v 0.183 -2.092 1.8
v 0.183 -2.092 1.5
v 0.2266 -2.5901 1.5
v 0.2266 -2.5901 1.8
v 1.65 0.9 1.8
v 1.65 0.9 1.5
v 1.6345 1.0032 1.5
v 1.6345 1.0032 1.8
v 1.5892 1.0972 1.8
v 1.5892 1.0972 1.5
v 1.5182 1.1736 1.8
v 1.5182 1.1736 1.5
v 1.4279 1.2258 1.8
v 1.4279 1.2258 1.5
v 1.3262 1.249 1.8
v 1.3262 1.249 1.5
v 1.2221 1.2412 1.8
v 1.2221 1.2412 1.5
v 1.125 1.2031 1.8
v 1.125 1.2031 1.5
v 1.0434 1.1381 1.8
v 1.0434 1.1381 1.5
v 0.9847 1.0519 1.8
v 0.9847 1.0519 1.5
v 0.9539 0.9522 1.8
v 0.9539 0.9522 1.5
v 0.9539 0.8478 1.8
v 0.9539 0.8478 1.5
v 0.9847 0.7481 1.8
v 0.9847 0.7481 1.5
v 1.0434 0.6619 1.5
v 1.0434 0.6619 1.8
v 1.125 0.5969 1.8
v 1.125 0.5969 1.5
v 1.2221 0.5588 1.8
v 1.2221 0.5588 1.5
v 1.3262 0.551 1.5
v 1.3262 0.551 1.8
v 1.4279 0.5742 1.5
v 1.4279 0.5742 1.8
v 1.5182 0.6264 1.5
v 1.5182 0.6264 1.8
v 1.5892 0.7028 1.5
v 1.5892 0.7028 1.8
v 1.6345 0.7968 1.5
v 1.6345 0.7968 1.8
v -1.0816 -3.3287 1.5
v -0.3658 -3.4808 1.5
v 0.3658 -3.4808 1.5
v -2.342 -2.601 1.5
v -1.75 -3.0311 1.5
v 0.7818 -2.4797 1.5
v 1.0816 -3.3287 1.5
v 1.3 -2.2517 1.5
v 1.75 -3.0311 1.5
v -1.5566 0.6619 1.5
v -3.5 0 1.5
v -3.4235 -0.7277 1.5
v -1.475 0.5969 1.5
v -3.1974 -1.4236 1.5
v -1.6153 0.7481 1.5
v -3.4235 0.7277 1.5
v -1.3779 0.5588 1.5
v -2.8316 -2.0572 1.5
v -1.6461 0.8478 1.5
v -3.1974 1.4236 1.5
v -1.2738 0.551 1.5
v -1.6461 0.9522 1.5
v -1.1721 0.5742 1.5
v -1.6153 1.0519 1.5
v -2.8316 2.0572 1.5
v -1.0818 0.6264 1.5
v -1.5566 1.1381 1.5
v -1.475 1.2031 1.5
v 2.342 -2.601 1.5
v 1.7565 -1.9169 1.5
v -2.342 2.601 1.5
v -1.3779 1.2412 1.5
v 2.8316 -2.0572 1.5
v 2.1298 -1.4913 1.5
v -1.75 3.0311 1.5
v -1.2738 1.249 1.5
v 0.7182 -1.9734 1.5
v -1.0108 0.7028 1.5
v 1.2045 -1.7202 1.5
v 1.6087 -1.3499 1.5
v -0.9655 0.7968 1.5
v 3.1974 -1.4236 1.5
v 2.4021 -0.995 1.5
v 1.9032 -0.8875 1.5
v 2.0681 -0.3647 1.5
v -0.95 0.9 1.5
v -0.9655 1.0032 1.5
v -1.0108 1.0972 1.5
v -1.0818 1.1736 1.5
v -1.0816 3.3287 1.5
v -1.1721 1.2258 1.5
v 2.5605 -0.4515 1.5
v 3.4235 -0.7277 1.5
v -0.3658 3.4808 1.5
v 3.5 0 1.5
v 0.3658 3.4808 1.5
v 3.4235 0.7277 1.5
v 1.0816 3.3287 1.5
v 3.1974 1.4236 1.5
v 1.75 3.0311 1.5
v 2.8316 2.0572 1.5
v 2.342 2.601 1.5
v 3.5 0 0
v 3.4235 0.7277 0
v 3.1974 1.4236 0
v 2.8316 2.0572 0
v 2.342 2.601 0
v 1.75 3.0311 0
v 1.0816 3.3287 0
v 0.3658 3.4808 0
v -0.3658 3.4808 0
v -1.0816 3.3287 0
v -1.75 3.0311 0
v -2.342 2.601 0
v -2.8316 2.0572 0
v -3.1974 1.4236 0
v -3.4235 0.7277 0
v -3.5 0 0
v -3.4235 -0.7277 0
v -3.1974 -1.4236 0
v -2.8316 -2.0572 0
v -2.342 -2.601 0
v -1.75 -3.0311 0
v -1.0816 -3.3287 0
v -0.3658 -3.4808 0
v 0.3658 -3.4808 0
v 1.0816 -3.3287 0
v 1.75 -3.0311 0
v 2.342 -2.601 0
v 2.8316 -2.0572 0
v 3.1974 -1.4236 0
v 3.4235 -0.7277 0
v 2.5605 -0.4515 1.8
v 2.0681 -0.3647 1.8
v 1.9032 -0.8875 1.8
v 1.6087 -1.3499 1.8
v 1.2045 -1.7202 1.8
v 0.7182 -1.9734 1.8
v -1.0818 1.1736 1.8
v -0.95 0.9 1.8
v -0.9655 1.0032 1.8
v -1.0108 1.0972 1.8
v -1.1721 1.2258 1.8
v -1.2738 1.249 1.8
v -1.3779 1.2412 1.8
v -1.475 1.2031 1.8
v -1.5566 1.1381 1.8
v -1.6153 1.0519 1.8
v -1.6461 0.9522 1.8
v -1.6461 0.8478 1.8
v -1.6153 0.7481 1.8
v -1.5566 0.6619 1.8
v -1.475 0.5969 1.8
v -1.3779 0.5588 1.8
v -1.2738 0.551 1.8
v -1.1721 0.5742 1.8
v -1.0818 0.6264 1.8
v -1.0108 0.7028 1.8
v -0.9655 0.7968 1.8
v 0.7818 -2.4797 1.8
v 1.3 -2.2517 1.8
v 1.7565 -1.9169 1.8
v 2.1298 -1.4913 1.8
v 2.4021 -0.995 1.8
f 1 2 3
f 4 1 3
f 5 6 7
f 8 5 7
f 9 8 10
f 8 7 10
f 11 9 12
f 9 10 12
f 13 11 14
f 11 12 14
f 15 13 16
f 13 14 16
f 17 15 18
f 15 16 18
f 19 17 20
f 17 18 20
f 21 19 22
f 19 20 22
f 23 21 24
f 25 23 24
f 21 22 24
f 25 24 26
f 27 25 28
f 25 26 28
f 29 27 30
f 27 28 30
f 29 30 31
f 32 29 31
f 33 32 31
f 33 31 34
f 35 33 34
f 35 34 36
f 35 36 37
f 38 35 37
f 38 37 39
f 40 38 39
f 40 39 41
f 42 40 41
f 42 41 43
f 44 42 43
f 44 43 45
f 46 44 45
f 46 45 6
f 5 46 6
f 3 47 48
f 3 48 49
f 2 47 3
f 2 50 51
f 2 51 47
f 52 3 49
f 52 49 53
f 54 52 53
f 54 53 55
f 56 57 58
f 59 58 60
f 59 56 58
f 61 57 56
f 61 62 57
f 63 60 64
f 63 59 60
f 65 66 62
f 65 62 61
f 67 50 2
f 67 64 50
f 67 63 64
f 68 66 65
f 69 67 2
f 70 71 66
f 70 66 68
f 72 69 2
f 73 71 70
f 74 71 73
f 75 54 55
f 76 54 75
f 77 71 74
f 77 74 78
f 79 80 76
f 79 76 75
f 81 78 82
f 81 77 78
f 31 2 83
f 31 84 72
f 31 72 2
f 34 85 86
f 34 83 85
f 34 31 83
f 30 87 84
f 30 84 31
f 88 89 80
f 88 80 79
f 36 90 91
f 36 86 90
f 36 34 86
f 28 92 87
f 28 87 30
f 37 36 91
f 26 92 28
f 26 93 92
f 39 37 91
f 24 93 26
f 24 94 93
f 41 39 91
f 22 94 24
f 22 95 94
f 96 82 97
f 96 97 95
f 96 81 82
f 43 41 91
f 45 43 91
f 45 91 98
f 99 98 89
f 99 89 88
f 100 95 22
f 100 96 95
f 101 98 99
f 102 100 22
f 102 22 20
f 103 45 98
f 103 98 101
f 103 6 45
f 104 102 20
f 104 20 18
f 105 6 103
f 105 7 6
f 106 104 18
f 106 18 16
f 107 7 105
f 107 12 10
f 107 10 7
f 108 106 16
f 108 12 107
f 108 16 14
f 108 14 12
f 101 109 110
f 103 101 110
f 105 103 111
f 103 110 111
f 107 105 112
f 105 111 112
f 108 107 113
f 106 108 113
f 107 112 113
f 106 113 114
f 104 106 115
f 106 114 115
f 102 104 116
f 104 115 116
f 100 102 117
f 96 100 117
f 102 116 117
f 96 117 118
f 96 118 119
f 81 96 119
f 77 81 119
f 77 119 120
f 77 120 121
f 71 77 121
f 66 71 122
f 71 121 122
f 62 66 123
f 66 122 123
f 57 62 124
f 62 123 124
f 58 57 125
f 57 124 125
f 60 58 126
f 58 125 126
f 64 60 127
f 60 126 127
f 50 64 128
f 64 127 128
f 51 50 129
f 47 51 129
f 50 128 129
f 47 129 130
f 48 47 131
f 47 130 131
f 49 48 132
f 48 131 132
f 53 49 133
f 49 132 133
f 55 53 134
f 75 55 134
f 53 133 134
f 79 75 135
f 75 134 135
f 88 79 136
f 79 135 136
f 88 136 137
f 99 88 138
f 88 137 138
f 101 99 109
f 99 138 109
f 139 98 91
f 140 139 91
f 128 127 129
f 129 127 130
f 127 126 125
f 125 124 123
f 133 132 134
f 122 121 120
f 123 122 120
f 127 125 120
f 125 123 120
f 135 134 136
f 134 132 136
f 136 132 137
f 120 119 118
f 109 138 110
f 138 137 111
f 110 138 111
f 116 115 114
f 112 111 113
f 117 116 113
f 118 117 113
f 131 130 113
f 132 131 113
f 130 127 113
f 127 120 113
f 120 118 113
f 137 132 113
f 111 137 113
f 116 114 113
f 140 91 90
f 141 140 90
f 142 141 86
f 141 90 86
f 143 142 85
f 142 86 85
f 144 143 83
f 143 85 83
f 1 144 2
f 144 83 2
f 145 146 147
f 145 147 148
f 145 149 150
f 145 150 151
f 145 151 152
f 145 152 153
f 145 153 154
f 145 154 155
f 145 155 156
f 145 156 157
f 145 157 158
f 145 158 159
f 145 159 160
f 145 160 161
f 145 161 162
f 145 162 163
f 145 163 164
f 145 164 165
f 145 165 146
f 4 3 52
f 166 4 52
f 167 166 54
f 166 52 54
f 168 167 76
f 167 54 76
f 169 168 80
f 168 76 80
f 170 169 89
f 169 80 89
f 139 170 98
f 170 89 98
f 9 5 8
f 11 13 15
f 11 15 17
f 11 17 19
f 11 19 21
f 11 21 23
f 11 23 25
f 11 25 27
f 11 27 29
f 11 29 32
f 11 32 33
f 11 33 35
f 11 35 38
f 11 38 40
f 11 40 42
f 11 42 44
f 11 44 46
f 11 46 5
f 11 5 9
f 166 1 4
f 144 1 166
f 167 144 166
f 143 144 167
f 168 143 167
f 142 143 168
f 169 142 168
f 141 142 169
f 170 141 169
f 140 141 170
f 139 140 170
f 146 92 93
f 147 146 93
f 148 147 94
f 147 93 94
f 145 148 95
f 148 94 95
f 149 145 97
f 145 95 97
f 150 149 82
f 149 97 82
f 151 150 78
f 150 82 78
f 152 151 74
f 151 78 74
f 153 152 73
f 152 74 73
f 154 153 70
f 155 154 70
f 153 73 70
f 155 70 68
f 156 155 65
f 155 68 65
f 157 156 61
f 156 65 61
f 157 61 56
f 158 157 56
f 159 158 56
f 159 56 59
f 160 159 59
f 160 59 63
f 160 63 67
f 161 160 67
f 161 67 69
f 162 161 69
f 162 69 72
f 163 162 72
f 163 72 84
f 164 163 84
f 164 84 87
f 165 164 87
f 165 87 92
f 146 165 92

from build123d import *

# Parameters (mm, degrees)
F0_R     = 3.5
F1_DEPTH = 1.5
F2_R     = 0.35
F3_DEPTH = 1.8


with BuildPart() as f1:
    # F0 (on Top) → F1 (new body)
    with BuildSketch(Plane.XY):
        Circle(F0_R)
    extrude(amount=F1_DEPTH)

    # F2 (on Top) → F3 (join)
    with BuildSketch(Plane.XY):
        with Locations((-1.3, 0.9)):
            Circle(F2_R)
        with Locations((1.3, 0.9)):
            Circle(F2_R)
        with BuildLine():
            Line((0.183027, -2.092009), (0.226605, -2.590106))
            ThreePointArc((0.226605, -2.590106), (1.756535, -1.916921), (2.5605, -0.451485))
            Line((2.5605, -0.451485), (2.068096, -0.364661))
            ThreePointArc((2.068096, -0.364661), (1.418739, -1.548282), (0.183027, -2.092009))
        make_face()
    extrude(amount=F3_DEPTH)


solid = f1.part
